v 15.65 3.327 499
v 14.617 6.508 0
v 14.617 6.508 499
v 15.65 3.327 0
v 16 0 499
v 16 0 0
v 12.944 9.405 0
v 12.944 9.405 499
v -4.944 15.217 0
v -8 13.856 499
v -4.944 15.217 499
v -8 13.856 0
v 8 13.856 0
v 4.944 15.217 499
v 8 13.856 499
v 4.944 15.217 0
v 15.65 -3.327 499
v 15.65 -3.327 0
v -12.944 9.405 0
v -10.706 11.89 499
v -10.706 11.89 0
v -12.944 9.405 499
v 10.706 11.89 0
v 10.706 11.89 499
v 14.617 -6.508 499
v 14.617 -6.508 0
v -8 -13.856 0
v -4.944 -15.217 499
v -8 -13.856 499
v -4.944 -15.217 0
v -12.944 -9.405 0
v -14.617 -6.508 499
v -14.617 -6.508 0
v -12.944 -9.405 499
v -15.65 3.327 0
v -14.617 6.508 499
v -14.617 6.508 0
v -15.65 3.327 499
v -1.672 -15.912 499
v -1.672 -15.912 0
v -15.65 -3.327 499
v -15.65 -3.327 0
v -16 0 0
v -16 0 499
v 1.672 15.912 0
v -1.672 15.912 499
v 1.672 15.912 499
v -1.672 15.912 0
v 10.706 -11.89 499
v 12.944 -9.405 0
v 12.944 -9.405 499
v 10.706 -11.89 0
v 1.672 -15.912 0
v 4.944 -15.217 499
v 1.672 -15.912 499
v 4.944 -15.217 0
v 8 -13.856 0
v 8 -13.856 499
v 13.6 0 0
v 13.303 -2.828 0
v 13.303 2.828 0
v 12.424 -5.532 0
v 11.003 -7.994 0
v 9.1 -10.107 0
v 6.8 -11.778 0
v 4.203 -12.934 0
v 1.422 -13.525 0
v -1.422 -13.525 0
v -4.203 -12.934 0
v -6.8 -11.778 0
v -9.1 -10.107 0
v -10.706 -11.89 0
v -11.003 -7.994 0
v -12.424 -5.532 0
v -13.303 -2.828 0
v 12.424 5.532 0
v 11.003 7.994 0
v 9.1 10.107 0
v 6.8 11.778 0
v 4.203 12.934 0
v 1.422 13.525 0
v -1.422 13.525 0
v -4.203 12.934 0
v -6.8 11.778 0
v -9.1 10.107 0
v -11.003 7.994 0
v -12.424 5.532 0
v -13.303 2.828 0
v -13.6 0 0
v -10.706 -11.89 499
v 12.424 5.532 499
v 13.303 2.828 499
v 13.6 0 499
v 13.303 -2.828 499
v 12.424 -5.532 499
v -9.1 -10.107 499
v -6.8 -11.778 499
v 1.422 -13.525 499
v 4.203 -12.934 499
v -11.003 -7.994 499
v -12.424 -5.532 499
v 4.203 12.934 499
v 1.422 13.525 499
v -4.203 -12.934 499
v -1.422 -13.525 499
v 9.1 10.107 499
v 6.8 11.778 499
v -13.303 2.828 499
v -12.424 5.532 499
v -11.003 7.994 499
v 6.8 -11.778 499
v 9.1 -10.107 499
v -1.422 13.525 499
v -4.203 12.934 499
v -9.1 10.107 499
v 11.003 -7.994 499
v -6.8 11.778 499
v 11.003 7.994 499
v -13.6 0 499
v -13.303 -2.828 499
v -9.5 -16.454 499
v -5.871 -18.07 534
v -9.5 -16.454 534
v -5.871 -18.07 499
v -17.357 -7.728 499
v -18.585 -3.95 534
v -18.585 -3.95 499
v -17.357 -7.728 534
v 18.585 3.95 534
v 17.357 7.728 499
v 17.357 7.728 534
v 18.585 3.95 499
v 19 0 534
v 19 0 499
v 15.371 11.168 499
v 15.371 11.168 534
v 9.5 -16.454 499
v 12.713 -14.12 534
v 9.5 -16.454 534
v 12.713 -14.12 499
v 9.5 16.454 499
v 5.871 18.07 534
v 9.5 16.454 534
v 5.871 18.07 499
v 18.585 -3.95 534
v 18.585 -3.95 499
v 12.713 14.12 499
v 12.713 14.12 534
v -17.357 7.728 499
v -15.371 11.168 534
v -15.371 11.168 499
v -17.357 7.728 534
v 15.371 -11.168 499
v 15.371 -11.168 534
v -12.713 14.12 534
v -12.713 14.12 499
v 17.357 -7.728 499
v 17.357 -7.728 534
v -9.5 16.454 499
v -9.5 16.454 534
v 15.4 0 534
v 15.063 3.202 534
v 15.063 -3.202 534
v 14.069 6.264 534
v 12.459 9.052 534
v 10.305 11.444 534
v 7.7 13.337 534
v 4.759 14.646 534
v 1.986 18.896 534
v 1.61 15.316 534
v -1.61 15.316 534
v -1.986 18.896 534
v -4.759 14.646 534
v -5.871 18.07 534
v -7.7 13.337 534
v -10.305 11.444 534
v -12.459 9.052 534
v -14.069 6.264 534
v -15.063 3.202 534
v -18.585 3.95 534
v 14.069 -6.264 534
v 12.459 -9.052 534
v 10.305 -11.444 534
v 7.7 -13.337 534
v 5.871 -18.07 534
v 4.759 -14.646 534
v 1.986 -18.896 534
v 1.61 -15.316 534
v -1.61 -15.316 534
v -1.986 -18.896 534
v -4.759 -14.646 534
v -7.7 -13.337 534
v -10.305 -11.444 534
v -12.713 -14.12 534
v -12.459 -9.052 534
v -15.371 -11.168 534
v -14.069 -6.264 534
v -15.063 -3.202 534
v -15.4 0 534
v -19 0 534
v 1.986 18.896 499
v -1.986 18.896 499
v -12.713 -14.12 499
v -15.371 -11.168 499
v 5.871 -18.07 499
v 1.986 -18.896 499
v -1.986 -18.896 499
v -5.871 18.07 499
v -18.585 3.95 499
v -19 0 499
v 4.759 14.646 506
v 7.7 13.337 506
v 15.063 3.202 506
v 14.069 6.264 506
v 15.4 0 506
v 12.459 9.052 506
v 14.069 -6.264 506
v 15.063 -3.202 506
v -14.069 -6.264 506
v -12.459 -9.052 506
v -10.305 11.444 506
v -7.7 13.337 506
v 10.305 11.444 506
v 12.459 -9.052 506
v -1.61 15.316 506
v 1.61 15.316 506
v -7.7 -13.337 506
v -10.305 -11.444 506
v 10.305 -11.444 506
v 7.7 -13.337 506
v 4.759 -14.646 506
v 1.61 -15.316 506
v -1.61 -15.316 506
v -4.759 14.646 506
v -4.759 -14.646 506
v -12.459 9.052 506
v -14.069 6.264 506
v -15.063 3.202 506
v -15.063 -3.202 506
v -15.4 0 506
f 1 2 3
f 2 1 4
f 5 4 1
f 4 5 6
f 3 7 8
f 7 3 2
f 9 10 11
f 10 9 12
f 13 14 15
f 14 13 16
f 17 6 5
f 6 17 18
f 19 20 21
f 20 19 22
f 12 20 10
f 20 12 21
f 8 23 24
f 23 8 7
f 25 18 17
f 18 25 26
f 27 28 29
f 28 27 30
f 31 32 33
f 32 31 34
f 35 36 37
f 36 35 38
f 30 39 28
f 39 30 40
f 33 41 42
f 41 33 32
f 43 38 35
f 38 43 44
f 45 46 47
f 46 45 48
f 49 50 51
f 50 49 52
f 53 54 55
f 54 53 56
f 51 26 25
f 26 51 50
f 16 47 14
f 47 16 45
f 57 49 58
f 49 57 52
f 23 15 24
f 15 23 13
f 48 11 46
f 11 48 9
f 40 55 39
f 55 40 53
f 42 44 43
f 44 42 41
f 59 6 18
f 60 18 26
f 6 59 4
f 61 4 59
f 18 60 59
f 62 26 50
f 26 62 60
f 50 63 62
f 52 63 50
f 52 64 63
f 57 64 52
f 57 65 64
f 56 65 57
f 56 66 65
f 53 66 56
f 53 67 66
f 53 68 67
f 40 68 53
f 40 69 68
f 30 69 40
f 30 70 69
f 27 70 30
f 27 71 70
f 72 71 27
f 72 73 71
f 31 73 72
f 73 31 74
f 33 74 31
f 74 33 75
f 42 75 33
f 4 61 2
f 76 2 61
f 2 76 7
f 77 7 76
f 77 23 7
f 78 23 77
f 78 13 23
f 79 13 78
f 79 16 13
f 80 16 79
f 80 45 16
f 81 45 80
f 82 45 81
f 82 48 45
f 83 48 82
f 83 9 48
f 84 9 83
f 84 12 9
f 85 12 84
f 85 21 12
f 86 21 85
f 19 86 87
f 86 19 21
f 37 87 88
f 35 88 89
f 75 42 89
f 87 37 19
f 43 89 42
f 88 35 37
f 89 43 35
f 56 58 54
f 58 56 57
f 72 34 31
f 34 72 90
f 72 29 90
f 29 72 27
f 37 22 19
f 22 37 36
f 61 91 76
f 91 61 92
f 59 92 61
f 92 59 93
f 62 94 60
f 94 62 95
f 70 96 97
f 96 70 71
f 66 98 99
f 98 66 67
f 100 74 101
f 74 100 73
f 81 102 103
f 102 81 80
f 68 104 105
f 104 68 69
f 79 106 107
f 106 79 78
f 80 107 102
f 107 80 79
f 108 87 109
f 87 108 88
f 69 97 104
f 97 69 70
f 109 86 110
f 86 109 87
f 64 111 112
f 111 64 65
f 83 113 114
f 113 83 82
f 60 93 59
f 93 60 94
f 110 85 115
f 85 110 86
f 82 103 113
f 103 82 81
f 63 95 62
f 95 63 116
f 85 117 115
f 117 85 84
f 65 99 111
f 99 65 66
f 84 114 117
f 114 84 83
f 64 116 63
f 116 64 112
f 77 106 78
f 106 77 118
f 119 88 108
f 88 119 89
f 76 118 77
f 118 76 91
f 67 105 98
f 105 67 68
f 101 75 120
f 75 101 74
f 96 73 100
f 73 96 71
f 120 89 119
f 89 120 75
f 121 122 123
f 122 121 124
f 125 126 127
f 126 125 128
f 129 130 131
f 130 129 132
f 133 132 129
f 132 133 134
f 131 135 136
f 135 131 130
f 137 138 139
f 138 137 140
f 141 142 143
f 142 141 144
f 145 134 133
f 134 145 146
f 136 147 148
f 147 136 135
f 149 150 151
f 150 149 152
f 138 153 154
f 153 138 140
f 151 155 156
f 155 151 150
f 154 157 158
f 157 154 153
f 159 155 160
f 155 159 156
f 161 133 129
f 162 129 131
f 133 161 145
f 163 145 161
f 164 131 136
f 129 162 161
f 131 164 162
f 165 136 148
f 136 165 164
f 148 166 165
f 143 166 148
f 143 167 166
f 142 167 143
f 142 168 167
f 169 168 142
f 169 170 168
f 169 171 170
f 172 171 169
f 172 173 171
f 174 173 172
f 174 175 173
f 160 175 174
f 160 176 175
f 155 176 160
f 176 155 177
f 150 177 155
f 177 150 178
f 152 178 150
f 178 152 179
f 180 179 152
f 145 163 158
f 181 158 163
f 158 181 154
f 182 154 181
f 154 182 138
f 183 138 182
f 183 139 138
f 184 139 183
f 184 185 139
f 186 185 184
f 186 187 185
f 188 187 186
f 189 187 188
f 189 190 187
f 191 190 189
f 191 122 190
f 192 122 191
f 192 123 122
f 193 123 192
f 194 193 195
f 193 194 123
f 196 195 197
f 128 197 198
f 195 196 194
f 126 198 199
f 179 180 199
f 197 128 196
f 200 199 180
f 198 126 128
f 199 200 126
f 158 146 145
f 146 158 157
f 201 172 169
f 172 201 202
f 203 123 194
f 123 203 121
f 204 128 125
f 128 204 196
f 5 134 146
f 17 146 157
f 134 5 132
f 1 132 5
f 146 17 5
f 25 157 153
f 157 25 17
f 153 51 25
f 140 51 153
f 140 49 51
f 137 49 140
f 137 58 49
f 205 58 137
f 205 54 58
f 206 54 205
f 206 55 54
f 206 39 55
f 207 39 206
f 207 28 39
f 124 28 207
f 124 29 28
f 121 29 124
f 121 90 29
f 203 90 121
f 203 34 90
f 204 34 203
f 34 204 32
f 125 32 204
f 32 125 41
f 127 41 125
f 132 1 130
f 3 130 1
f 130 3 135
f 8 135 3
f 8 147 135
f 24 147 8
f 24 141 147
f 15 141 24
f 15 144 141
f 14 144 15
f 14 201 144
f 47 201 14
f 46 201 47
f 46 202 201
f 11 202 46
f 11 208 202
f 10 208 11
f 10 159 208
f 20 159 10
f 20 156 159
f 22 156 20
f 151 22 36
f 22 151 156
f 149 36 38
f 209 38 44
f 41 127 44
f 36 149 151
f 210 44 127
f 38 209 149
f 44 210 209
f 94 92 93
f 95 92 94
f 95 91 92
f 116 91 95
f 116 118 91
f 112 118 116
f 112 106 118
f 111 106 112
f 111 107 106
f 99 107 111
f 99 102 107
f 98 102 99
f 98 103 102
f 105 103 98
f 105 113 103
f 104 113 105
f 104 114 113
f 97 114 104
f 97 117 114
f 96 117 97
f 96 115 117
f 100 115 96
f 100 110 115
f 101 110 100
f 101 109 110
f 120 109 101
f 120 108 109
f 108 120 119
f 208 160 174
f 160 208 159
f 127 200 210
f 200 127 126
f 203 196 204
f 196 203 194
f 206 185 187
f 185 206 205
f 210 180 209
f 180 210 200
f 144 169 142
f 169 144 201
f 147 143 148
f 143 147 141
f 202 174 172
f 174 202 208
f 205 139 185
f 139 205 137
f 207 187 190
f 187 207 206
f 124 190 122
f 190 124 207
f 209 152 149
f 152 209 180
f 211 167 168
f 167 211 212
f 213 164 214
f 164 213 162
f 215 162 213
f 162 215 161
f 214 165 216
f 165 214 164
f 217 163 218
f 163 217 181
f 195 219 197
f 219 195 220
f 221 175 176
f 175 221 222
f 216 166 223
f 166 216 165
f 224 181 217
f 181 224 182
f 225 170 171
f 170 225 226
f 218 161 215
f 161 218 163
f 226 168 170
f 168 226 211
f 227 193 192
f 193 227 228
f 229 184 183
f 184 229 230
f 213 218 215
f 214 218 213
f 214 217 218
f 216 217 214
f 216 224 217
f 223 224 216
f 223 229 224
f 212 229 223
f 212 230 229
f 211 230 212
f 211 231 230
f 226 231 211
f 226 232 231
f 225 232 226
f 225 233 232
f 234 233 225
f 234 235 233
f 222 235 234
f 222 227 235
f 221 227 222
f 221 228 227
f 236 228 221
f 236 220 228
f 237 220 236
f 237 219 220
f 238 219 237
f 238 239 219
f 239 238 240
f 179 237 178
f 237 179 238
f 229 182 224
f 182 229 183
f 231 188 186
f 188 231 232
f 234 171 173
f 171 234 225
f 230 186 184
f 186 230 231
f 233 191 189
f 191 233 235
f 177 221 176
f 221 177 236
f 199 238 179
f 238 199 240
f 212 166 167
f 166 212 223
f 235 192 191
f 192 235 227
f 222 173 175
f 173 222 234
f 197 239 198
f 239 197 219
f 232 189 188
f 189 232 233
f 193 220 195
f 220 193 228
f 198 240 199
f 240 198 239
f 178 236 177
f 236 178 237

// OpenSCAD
// Parameters
pipe_standard = 1; //[1:1:1]
nominal_diameter = 32; //[16:64:1]
length_mm = 500; //[250:1000:1]
pipe_od = 32; //[20:64:0.5]
pipe_wall = 2.4; //[1.2:4.8:0.1]
fitting_length = 35; //[20:70:1]
fitting_od_extra = 6; //[2:12:0.5]
fitting_wall_extra = 1.2; //[0.5:3:0.1]
socket_depth = 28; //[15:60:1]
overlap = 1; //[0.5:2:0.1]

// Module for HT Pipe
module ht_pipe() {
  color([0.85, 0.85, 0.8]) { // PVC color
    union() {
      // Pipe body
      difference() {
        cylinder(h=length_mm, r=pipe_od/2, center=false);
        translate([0, 0, 0])
          cylinder(h=length_mm, r=pipe_od/2 - pipe_wall, center=false);
      }
      
      // Integrated end fitting
      translate([0, 0, length_mm - overlap])
        difference() {
          cylinder(h=fitting_length, r=pipe_od/2 + fitting_od_extra/2, center=false);
          translate([0, 0, fitting_length - socket_depth])
            cylinder(h=socket_depth, r=pipe_od/2 + fitting_od_extra/2 - (pipe_wall + fitting_wall_extra), center=false);
        }
    }
  }
}

// Assembly
module assembly() {
  ht_pipe();
}

assembly();
